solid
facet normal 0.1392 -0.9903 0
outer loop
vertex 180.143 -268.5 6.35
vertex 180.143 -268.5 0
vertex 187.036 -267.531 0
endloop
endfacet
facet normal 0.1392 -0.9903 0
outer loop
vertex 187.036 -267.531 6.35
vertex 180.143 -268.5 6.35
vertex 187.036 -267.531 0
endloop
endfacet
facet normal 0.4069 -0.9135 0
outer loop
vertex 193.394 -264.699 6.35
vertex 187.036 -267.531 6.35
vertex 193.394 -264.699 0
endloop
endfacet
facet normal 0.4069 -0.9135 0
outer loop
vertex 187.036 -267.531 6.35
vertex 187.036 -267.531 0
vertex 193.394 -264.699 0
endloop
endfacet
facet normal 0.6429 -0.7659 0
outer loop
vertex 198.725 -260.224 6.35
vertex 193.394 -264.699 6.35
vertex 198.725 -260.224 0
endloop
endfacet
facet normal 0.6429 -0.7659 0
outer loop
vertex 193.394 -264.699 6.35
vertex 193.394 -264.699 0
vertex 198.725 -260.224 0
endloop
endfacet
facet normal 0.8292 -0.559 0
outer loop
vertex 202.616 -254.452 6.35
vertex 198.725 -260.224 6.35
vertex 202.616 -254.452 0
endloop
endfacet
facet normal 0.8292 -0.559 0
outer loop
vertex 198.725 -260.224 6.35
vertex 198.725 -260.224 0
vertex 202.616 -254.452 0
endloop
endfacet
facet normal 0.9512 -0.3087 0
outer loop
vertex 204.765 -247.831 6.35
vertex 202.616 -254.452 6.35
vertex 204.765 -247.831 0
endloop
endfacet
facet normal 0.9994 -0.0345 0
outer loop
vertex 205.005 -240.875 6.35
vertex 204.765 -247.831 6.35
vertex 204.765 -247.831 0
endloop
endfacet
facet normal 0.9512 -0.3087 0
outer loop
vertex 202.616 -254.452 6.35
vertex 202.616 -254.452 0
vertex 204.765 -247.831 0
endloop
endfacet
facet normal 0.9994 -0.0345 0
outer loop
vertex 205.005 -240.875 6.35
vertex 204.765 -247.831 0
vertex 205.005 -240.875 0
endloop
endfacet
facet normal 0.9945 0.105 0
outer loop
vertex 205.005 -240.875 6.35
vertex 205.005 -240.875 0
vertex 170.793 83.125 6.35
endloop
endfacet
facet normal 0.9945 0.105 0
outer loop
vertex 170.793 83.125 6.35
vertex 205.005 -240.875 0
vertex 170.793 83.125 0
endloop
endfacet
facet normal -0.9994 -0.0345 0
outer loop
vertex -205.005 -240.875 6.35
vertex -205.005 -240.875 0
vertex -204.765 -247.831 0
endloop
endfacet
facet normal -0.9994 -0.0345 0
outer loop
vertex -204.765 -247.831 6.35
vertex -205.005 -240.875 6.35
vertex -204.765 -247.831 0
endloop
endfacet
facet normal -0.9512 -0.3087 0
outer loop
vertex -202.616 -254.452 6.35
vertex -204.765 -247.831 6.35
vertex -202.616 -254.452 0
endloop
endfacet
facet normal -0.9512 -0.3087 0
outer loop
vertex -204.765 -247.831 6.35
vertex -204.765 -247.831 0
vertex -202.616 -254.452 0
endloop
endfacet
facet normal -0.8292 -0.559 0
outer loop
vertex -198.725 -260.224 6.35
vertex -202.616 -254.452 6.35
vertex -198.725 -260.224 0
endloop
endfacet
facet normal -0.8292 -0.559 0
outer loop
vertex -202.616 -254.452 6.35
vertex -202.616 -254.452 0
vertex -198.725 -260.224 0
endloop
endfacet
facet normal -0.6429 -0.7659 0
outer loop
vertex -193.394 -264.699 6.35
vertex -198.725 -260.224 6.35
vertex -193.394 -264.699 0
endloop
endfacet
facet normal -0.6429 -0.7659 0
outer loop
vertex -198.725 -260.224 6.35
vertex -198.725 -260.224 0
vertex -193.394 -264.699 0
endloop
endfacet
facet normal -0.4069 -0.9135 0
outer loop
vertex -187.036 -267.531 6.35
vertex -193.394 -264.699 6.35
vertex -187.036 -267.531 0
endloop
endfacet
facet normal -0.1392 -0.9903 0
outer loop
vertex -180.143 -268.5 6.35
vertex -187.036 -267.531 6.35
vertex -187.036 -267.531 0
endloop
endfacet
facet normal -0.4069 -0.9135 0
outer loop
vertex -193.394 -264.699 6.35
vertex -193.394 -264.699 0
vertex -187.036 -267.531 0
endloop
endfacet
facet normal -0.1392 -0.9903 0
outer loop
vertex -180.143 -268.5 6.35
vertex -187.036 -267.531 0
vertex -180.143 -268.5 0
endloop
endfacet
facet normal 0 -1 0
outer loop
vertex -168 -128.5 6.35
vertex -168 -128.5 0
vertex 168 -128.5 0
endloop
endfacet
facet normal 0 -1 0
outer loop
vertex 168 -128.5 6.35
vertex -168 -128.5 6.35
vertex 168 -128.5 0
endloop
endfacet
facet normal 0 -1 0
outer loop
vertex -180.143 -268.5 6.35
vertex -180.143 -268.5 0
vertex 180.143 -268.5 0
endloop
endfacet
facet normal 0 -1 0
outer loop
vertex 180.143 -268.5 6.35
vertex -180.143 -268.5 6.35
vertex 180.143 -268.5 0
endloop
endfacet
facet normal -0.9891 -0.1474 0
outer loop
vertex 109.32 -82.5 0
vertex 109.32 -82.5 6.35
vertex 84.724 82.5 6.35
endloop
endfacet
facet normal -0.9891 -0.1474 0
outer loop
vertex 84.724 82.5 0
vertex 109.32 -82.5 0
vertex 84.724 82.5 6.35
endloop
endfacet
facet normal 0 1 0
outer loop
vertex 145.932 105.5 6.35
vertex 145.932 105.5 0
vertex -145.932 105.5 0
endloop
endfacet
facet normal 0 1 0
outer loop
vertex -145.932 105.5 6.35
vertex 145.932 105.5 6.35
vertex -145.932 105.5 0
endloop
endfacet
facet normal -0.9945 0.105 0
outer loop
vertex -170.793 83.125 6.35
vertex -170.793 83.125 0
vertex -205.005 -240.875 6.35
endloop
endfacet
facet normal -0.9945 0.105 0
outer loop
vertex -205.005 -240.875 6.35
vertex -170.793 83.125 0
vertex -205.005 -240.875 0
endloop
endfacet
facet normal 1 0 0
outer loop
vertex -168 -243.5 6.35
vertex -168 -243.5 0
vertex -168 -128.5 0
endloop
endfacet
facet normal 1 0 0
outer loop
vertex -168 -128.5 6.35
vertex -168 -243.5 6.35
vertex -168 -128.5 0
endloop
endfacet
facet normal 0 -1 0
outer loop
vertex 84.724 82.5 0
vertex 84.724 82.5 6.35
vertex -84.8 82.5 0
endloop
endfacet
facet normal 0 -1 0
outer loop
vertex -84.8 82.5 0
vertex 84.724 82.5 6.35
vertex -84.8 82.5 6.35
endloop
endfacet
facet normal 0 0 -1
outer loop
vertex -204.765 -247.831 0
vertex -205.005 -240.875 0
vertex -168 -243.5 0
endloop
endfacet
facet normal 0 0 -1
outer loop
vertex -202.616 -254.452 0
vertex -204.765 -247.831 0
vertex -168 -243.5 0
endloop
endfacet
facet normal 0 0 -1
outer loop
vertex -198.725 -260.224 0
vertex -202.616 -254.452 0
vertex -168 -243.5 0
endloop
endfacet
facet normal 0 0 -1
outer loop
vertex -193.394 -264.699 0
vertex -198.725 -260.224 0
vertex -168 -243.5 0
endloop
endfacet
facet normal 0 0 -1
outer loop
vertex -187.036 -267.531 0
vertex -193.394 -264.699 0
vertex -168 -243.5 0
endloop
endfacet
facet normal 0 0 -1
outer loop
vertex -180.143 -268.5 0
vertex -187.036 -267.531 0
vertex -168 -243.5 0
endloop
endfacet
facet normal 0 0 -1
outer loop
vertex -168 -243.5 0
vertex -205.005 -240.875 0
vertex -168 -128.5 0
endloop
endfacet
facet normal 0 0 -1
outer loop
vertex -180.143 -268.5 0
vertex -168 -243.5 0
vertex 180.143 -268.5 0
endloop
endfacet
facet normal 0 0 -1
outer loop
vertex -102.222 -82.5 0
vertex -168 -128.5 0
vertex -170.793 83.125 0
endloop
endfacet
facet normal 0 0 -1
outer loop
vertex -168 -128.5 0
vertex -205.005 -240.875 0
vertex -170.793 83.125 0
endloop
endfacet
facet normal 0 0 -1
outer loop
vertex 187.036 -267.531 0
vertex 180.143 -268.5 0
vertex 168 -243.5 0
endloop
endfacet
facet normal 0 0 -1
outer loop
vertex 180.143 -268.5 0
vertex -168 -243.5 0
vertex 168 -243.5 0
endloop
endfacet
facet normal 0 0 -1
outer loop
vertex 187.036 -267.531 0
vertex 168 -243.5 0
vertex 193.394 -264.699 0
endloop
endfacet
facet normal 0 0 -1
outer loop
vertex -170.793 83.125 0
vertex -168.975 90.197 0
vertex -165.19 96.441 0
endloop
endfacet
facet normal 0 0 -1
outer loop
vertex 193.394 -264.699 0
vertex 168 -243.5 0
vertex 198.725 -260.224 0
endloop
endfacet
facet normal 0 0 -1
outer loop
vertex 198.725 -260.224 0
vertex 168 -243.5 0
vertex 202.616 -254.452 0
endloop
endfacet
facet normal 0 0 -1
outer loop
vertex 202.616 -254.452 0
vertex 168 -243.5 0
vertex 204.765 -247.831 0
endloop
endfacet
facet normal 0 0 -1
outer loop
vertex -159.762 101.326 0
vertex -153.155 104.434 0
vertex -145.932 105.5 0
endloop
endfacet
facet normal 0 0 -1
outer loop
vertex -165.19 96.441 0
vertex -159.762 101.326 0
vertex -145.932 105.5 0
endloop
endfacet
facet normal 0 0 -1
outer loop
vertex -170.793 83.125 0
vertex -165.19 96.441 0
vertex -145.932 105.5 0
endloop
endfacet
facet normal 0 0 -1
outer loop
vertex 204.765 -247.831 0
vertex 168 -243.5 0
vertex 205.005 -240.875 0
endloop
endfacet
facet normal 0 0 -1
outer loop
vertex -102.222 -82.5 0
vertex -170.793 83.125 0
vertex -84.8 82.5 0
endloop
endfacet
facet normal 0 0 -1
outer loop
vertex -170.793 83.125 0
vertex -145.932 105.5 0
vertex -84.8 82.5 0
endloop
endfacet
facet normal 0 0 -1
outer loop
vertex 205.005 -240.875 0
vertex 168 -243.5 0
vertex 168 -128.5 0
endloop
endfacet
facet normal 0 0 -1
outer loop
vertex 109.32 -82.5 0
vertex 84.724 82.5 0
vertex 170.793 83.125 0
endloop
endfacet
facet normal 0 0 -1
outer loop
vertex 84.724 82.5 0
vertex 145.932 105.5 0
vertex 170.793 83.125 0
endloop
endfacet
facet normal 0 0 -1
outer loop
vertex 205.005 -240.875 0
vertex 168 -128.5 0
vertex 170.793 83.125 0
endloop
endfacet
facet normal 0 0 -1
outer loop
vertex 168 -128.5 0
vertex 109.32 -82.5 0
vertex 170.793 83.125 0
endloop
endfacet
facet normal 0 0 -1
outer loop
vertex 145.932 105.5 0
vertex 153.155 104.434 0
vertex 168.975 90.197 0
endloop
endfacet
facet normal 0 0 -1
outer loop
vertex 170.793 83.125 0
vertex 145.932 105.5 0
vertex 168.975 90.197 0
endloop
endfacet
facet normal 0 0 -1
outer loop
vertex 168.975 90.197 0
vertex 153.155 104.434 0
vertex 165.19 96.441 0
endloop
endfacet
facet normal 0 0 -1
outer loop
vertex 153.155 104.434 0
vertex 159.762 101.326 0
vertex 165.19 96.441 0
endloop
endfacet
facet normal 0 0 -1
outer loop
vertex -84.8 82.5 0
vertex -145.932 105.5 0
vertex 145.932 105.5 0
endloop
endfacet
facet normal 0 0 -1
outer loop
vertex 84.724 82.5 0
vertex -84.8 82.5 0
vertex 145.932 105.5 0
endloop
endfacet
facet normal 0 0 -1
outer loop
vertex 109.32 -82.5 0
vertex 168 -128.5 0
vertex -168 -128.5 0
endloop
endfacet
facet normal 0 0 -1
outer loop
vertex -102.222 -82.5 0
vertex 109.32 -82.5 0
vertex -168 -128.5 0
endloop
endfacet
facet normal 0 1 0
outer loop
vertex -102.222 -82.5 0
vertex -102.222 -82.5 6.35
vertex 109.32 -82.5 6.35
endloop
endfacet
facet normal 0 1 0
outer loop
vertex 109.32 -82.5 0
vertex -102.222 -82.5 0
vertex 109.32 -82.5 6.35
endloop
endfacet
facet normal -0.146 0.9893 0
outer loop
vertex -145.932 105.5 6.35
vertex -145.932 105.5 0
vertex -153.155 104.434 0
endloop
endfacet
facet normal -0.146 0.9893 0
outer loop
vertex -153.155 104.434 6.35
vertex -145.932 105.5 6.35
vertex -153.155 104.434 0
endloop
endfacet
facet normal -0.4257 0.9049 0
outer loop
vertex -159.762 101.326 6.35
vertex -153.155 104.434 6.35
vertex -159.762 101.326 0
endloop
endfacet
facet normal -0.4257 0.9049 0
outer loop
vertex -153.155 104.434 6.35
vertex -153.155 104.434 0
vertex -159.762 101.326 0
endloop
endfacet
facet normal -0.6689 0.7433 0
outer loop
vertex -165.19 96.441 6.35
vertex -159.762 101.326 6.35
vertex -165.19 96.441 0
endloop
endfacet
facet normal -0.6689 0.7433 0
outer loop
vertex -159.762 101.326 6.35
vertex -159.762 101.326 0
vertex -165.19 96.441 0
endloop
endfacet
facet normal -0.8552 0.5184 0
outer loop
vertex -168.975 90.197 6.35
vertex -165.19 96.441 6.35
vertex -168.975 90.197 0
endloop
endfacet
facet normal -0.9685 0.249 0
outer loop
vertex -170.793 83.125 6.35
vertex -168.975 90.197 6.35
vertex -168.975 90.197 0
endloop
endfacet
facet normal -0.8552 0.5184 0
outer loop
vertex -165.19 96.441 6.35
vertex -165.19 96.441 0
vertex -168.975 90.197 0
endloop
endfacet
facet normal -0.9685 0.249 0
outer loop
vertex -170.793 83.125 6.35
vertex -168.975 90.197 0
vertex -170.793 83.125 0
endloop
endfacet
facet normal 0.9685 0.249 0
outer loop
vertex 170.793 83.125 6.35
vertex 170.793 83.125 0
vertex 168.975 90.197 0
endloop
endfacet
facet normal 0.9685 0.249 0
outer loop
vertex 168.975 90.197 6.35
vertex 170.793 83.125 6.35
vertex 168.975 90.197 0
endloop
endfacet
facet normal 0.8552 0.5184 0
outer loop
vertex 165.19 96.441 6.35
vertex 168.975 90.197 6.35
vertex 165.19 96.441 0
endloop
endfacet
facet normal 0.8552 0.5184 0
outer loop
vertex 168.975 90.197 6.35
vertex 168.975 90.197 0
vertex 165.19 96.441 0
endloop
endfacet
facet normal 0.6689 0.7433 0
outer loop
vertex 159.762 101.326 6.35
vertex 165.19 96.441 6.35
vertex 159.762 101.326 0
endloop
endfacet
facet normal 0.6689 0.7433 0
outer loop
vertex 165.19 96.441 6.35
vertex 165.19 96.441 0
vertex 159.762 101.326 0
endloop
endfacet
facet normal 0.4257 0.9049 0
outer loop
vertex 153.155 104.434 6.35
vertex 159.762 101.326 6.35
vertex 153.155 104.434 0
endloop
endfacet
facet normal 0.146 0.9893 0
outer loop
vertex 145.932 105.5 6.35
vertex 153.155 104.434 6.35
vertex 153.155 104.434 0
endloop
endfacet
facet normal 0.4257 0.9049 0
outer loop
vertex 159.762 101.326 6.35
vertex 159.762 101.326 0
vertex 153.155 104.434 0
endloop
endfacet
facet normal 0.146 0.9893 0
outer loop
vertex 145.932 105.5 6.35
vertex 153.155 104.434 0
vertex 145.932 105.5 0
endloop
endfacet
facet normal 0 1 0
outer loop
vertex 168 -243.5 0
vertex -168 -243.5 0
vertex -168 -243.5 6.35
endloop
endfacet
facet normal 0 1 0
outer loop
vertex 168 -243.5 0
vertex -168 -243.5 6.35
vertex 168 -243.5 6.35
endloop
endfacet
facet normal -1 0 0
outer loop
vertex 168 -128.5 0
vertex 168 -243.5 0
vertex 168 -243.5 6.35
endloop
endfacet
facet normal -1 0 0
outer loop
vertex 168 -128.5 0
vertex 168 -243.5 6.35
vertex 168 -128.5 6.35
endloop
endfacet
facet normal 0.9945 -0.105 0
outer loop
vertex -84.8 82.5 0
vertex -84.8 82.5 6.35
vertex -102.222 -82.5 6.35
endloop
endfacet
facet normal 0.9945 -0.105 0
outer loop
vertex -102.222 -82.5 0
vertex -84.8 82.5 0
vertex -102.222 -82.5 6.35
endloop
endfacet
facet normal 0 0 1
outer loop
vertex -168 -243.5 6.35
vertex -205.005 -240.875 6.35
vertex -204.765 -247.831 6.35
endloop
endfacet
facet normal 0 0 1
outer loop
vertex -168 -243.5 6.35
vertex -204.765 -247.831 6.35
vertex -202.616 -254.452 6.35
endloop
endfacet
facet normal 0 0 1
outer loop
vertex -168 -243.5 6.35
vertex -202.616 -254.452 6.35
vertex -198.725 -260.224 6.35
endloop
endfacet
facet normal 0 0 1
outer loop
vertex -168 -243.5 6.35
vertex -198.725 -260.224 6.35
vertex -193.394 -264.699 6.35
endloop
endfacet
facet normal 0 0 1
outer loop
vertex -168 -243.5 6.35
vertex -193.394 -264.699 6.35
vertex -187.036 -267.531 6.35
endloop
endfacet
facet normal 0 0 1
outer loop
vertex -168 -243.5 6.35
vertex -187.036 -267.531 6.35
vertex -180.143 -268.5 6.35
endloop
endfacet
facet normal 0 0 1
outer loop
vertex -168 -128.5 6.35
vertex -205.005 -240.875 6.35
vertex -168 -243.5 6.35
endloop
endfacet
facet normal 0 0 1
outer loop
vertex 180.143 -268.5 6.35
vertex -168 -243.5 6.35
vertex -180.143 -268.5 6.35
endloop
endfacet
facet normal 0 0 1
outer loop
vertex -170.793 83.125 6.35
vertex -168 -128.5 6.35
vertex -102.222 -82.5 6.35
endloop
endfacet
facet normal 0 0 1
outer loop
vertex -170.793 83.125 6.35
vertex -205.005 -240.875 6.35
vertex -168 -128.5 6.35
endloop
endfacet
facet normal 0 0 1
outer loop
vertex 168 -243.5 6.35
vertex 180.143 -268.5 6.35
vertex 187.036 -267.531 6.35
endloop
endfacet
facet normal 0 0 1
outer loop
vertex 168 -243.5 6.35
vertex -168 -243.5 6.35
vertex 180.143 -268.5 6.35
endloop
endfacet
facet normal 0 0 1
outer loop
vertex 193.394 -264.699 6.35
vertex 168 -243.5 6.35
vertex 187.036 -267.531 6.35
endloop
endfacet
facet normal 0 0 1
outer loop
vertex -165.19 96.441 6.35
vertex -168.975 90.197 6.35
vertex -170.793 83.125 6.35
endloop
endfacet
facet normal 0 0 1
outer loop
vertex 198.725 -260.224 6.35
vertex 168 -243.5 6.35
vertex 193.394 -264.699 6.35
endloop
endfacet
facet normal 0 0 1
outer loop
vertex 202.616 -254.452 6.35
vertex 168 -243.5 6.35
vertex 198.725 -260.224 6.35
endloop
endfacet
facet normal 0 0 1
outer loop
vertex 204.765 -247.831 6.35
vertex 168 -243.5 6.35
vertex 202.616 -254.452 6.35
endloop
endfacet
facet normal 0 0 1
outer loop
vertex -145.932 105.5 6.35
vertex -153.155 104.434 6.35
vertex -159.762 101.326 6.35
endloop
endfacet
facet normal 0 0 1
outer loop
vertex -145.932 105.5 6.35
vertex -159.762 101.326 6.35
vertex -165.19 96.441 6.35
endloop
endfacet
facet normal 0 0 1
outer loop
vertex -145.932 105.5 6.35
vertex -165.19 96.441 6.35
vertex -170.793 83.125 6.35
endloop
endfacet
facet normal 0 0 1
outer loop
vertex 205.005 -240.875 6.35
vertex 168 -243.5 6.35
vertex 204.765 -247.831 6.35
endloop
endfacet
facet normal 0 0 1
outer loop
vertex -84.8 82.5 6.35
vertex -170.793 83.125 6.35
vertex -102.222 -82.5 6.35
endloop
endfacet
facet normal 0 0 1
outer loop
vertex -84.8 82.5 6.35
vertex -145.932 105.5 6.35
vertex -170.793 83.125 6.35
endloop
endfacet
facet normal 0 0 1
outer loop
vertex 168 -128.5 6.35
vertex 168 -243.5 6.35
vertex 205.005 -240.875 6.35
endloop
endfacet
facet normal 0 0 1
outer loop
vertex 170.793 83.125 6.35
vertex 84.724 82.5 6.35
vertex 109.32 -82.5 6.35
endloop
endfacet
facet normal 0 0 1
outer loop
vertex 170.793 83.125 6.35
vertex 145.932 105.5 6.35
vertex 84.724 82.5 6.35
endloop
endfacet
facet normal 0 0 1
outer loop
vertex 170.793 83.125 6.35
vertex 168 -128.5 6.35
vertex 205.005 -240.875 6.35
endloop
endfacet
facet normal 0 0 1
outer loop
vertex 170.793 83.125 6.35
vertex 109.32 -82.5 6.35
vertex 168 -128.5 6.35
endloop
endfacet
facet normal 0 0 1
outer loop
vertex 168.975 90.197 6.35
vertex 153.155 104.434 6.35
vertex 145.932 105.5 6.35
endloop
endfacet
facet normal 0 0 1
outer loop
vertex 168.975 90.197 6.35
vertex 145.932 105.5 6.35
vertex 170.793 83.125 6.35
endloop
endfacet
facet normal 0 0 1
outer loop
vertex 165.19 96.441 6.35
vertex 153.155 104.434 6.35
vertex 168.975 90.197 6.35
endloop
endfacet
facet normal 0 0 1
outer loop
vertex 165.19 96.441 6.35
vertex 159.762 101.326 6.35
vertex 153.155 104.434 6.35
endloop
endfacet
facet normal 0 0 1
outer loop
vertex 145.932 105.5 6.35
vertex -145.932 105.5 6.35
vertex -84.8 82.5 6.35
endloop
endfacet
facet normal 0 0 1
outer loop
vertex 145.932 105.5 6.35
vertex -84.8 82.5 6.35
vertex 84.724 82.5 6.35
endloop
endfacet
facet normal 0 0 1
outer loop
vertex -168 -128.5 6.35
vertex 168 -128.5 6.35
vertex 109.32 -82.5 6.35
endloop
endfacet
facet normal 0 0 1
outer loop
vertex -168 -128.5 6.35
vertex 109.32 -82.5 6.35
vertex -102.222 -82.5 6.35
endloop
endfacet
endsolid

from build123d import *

# Parameters (mm, degrees)
SKETCH1_W           = 336
SKETCH1_H           = 115
BOSS_EXTRUDE1_DEPTH = 6.35
CUT_EXTRUDE1_DEPTH  = 6.35


with BuildPart() as part:
    # Sketch1 → Boss-Extrude1 (new body)
    with BuildSketch(Plane.XY):
        with BuildLine():
            Line((145.931677019, 105.5), (-145.931677019, 105.5))
            ThreePointArc((-145.931677019, 105.5), (-162.655478234, 99.082639019), (-170.793465899, 83.125157832))
            Line((-170.793465899, 83.125157832), (-205.004646024, -240.874842168))
            ThreePointArc((-205.004646024, -240.874842168), (-198.725496162, -260.223801216), (-180.142857143, -268.5))
            Line((-180.142857143, -268.5), (180.142857143, -268.5))
            ThreePointArc((180.142857143, -268.5), (198.725496162, -260.223801216), (205.004646024, -240.874842168))
            Line((205.004646024, -240.874842168), (170.793465899, 83.125157832))
            ThreePointArc((170.793465899, 83.125157832), (162.655478234, 99.082639019), (145.931677019, 105.5))
        make_face()
        Polygon((-83, 80.5), (83, 80.5), (107, -80.5), (-100, -80.5), align=None, mode=Mode.SUBTRACT)
        with Locations((0, -186)):
            Rectangle(SKETCH1_W, SKETCH1_H, mode=Mode.SUBTRACT)
    extrude(amount=BOSS_EXTRUDE1_DEPTH)

    # Sketch2 → Cut-Extrude1 (cut)
    with BuildSketch(Plane.XY.offset(6.35)):
        Polygon((-102.222298481, -82.5), (109.320235916, -82.5), (84.723962625, 82.5), (-84.799938233, 82.5), align=None)
    extrude(amount=-CUT_EXTRUDE1_DEPTH, mode=Mode.SUBTRACT)


solid = part.part
